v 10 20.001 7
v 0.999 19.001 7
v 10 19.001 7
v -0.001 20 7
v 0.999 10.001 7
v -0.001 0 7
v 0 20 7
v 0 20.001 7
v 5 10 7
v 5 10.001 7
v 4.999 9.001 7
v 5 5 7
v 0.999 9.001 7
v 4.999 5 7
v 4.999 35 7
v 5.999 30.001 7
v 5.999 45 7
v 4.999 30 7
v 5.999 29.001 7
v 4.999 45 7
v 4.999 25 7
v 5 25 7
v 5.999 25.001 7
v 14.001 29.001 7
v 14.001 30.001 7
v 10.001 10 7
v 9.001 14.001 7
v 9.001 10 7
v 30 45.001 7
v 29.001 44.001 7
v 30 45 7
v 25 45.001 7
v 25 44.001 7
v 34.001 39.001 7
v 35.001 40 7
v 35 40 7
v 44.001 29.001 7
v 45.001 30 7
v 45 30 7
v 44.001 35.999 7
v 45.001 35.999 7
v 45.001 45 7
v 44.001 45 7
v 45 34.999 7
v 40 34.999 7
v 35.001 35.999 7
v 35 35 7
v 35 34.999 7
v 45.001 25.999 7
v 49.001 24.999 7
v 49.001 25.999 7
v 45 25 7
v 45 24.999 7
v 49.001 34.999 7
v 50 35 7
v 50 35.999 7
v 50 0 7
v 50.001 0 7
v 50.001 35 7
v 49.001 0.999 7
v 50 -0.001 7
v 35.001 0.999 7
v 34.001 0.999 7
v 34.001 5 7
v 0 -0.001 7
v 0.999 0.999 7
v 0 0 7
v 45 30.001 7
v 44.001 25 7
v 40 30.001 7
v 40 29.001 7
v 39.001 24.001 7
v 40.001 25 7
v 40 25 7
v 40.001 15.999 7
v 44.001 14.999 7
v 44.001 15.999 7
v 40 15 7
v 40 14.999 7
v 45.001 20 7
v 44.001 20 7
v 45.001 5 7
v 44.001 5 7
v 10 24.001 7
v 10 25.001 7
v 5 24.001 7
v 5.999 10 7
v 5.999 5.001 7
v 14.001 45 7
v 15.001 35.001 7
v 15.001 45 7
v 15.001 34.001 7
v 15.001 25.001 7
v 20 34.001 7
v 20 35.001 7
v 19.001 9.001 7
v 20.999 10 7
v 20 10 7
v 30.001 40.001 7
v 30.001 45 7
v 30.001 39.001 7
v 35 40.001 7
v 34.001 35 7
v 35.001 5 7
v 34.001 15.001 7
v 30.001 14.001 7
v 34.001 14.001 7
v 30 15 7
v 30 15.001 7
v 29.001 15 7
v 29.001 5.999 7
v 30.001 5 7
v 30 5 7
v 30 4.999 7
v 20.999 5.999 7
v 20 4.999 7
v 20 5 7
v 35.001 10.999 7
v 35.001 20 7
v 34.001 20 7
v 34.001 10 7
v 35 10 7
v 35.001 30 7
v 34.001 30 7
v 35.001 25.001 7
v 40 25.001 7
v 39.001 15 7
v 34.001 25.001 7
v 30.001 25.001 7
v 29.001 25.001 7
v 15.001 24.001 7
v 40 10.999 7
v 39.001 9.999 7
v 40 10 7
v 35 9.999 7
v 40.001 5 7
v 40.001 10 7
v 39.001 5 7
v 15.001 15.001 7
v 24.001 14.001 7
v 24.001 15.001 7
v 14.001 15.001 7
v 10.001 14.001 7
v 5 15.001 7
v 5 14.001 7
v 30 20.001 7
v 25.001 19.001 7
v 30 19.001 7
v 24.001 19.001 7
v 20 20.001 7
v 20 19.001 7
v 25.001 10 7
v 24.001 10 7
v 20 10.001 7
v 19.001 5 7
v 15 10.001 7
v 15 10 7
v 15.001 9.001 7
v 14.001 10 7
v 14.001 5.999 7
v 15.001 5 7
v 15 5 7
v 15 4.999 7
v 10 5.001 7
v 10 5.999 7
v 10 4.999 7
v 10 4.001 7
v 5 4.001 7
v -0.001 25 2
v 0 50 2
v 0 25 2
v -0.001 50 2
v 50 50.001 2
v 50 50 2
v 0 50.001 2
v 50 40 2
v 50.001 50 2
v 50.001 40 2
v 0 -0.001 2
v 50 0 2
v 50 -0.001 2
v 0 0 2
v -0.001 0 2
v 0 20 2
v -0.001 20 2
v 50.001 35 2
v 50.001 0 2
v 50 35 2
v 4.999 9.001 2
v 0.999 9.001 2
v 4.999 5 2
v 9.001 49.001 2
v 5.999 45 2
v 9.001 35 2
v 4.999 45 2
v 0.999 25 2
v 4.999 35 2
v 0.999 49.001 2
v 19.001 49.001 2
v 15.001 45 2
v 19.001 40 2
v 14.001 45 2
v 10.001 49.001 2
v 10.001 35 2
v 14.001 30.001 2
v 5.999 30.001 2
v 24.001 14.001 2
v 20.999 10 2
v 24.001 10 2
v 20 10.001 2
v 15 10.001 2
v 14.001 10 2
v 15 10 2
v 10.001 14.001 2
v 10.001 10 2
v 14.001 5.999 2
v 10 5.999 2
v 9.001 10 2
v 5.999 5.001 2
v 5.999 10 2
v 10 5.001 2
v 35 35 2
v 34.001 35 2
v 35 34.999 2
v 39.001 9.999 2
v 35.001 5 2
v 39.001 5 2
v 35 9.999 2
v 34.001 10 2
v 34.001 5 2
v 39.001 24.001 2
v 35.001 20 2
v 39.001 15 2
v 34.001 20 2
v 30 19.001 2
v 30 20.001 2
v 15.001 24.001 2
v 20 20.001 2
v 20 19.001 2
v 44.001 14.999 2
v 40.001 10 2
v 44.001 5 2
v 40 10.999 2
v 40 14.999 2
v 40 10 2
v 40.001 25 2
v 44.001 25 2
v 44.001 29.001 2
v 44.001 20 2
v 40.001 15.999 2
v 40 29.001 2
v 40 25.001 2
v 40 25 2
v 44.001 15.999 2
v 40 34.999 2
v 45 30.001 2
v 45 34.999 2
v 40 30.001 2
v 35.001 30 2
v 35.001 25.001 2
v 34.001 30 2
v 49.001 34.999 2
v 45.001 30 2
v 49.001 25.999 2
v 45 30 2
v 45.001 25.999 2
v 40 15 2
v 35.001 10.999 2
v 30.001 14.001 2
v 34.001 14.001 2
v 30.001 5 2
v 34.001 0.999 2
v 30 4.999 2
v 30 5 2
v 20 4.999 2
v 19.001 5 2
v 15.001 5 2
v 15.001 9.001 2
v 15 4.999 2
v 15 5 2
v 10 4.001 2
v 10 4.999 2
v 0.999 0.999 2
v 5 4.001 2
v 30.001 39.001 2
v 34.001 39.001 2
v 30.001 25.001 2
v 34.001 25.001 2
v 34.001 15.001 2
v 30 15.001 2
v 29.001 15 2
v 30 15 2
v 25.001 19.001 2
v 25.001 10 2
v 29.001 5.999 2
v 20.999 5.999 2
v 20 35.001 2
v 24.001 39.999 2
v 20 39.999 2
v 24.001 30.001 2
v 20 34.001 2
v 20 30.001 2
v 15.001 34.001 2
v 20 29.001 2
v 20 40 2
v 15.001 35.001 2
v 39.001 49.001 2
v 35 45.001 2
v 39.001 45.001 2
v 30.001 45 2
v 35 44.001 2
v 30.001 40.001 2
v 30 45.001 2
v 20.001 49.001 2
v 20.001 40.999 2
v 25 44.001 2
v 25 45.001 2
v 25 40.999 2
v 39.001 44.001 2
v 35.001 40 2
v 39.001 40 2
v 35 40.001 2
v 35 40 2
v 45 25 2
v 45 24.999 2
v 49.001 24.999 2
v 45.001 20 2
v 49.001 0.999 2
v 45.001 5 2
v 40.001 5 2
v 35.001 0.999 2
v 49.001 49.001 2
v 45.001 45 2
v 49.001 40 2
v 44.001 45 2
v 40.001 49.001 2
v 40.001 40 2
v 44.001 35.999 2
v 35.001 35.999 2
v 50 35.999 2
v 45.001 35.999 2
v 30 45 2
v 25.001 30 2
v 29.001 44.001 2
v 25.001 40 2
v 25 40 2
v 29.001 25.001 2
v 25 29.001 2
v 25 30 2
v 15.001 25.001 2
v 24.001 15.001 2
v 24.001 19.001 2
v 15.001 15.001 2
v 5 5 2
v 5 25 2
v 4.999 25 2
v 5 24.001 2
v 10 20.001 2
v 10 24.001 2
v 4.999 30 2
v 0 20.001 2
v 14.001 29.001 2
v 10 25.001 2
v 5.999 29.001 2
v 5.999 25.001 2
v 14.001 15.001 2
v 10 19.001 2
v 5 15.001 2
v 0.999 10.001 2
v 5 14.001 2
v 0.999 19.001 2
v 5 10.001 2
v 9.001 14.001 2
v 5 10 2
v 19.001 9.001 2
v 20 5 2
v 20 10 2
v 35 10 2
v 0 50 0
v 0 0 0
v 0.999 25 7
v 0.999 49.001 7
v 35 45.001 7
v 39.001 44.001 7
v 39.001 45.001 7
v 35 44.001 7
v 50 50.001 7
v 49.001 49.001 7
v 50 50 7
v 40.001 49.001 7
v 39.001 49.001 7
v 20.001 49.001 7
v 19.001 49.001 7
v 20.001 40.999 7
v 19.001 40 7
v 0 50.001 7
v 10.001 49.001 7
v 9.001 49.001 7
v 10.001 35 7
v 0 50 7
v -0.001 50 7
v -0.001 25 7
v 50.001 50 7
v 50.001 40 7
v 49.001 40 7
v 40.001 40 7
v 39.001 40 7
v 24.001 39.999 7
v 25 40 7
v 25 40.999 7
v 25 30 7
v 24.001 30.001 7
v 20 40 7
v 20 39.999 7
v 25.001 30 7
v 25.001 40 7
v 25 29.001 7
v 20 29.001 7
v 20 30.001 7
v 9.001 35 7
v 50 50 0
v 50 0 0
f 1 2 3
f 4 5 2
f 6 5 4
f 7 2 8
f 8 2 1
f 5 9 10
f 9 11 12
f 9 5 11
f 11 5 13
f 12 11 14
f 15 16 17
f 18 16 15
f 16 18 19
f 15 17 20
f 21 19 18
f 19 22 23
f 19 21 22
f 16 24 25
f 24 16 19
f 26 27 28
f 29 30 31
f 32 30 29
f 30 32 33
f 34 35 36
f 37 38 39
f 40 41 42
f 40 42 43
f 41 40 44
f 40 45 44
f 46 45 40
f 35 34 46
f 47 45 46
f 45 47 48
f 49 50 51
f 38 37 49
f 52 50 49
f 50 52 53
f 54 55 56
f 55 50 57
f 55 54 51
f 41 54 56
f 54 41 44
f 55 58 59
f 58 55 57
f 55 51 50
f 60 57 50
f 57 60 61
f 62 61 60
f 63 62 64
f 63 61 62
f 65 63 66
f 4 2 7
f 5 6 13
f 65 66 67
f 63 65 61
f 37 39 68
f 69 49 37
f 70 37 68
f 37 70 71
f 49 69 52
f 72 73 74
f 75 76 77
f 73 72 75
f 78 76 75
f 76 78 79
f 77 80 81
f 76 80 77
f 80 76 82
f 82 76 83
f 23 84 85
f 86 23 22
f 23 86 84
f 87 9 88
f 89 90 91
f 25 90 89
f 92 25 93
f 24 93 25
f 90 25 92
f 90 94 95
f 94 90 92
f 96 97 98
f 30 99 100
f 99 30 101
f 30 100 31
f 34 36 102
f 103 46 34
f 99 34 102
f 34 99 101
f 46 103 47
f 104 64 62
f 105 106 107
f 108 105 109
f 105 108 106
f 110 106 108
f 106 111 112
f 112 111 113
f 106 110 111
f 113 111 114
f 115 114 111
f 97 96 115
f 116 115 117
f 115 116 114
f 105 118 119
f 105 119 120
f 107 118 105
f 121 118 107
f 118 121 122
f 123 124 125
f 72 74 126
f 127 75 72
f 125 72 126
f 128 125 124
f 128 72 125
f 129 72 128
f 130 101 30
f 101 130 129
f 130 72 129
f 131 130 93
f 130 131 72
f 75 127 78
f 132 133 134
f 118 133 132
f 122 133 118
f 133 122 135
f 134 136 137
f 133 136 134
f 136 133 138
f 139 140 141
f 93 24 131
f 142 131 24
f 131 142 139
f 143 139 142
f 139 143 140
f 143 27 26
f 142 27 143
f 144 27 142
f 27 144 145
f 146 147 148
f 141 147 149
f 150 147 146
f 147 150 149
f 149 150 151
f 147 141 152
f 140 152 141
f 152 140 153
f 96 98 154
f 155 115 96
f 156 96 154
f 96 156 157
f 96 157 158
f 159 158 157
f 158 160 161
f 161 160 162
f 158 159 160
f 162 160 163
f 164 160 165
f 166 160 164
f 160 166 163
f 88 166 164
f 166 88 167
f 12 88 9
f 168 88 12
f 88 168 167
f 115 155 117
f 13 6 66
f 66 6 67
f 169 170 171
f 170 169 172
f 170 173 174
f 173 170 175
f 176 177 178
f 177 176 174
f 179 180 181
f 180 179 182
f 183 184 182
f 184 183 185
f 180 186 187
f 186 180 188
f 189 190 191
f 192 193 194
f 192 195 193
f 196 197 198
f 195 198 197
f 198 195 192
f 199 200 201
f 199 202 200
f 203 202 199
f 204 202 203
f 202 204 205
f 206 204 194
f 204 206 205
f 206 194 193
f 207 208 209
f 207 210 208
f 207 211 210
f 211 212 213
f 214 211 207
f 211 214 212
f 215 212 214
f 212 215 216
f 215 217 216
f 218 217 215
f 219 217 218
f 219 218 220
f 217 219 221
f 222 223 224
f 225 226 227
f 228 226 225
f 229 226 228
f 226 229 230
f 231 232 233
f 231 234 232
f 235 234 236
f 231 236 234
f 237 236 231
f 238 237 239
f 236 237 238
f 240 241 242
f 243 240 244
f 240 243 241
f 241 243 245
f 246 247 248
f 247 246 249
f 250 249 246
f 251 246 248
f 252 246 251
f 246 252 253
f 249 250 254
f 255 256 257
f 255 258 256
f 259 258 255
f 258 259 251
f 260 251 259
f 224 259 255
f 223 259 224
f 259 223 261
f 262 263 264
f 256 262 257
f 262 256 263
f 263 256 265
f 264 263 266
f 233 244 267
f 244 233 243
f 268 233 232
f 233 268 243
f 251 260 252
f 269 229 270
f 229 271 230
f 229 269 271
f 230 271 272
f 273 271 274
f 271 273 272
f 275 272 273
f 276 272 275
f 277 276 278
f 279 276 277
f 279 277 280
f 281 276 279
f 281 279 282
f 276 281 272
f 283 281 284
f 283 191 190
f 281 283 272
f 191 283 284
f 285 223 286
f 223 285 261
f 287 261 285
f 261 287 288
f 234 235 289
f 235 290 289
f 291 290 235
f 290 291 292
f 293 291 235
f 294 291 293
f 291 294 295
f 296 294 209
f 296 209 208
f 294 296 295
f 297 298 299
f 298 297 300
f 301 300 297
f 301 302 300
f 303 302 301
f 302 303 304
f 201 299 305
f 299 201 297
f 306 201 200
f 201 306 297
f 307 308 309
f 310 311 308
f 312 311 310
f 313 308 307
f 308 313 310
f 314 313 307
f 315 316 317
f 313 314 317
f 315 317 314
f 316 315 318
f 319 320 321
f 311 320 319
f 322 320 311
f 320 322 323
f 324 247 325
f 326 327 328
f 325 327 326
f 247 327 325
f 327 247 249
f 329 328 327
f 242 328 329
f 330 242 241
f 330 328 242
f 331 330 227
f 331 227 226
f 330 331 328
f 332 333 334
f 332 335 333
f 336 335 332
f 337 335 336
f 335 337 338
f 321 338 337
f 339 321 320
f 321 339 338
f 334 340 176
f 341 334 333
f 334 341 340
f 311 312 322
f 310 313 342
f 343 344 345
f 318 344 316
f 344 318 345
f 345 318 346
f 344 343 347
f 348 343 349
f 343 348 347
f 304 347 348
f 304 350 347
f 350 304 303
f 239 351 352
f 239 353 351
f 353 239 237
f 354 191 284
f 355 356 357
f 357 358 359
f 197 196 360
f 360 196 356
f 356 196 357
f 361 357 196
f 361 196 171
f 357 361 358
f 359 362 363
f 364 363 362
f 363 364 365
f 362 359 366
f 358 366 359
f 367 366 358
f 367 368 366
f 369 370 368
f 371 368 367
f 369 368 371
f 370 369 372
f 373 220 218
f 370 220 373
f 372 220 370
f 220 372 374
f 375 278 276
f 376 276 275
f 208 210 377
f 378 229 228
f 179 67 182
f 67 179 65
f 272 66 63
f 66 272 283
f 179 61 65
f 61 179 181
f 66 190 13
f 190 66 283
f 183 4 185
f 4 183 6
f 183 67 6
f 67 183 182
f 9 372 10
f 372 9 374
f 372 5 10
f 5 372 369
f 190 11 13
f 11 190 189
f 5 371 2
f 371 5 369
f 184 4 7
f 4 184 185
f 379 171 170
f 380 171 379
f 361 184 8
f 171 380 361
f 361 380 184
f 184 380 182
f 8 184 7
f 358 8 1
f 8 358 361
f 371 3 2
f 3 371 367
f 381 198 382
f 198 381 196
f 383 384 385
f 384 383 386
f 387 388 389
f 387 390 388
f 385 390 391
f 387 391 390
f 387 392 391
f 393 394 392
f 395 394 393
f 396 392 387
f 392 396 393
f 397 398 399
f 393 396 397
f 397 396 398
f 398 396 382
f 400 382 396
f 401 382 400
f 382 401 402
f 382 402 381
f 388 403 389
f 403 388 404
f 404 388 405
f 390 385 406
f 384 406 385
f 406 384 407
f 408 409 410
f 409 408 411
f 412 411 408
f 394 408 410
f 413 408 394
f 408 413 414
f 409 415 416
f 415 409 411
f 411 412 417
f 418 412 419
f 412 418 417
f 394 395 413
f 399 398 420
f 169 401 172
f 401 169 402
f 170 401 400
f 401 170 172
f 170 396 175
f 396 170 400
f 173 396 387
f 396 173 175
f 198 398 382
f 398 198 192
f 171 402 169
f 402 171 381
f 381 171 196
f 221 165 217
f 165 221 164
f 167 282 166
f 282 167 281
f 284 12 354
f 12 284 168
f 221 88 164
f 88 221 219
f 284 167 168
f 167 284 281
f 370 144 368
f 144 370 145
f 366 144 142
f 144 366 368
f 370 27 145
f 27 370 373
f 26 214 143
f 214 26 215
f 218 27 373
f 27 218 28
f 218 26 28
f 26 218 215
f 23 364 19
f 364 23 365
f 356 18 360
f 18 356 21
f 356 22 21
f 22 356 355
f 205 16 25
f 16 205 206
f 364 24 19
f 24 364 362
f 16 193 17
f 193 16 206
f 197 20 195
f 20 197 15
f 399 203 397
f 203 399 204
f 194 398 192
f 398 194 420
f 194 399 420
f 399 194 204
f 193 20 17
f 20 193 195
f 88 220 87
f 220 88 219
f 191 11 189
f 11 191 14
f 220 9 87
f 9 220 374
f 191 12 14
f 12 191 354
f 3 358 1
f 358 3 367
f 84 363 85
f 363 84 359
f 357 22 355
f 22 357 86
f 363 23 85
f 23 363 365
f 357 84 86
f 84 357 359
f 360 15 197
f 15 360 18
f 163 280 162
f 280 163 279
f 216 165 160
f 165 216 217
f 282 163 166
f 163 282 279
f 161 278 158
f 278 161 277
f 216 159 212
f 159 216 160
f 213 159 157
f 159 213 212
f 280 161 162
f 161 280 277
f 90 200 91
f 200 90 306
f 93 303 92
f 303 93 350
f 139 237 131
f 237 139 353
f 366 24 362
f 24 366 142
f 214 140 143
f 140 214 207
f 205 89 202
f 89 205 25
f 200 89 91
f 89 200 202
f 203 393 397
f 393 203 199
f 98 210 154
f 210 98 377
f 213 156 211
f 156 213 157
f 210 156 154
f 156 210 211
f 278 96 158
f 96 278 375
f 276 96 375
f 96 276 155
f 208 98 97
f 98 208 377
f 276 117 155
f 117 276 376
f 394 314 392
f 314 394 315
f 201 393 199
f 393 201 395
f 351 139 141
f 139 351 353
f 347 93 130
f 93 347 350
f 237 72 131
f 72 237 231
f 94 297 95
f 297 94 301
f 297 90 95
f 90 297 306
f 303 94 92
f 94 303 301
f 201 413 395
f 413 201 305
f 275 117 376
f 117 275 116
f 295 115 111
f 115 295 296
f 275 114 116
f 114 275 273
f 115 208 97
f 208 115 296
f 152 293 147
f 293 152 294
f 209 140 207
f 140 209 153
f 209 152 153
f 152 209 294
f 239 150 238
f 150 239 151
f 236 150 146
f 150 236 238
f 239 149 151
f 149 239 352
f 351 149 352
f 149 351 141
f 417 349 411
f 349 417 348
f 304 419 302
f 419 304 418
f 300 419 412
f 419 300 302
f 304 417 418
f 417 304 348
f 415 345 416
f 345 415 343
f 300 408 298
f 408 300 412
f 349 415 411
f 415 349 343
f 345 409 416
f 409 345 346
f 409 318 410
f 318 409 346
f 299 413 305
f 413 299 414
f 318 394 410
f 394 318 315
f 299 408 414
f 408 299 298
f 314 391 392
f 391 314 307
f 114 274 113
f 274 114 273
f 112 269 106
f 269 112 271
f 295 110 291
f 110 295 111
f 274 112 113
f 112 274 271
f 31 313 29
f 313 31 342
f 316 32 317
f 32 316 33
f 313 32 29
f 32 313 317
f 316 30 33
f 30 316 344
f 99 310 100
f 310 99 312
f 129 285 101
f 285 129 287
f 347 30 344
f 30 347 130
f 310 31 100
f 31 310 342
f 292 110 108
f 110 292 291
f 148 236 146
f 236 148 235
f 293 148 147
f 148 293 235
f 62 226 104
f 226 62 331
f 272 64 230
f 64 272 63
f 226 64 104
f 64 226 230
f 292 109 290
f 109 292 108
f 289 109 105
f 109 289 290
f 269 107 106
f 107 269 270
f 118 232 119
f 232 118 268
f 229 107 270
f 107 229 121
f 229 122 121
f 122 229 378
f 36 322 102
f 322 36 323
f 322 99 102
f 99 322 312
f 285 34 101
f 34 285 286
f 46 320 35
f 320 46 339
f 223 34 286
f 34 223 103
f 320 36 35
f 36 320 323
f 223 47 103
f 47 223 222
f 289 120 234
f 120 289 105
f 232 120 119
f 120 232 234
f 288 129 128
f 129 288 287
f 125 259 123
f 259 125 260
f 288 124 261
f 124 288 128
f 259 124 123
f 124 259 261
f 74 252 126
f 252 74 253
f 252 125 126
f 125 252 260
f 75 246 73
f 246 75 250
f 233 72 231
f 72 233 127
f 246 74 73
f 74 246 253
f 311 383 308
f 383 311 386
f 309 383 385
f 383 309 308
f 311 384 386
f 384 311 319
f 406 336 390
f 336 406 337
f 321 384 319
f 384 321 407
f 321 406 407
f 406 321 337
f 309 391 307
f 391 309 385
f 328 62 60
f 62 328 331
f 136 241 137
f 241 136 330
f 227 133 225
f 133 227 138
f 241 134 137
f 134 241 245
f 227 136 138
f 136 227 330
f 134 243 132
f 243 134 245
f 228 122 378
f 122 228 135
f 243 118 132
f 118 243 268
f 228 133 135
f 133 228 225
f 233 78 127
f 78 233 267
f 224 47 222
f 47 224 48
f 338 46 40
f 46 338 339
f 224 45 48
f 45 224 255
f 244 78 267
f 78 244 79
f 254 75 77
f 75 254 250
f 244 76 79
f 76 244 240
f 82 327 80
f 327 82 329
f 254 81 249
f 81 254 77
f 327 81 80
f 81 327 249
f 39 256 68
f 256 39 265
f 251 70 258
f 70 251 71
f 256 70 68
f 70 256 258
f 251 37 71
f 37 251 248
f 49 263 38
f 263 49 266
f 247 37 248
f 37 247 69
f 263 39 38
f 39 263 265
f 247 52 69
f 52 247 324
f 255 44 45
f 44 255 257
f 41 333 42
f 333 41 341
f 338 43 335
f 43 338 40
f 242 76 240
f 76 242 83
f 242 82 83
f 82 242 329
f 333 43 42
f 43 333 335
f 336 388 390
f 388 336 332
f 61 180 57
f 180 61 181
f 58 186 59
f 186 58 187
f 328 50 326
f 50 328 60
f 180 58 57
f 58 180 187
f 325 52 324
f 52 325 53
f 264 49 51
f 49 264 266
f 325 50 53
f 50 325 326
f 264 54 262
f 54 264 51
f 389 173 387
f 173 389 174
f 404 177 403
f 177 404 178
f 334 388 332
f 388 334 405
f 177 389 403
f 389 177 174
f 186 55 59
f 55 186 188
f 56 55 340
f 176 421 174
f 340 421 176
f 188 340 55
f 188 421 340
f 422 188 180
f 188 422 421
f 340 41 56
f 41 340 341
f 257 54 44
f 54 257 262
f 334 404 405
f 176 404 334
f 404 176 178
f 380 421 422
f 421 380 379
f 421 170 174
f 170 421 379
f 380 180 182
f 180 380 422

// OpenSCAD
tile_width = 5;
wall = 1;
wall_height = 5;
plate_height = 2;

mazestring="03,06,02,06,00,02,02,02,02,06,br,05,02,12,04,04,06,02,10,10,12,br,01,09,04,08,08,12,08,08,08,04,br,01,12,04,00,04,00,04,00,08,12,br,01,03,12,12,04,04,08,08,01,04,br,01,09,08,04,04,08,08,08,12,04,br,09,00,12,08,04,08,00,12,00,04,br,01,08,01,08,12,00,00,01,12,12,br,01,08,08,09,00,12,00,09,08,04,br,09,08,08,08,08,09,08,01,08,12,br";


width=search("b",mazestring,1)[0]/3;
height=len(search("b",mazestring,99999)[0]);

maze(mazestring,width,height,tile_width,wall,wall_height,plate_height);



module maze(ms,w,h,t,wall,wallh,plateh){

	cube([h*t,w*t,plateh],false);
	union()
	for (j=[0:h-1]){
		for (i=[0:w-1]){
			translate([j*t,i*t,0]){
				translate([0,0,plateh]){
					wallcalc(str(ms[i*3+j*(w+1)*3], ms[i*3+j*(w+1)*3+1]), t, wall, wallh);
				}
			}
		}
	}
}


module wallcalc(i, t, wt,wh){
echo(i);
		if(i == "15"){
			wall(1,1,1,1, i, t, wt,wh);
		}else if(i == "14"){
			wall(0,1,1,1, i, t, wt,wh);
		}else if(i == "13"){
			wall(1,0,1,1, i, t, wt,wh);
		}else if(i == "12"){
			wall(0,0,1,1, i, t, wt,wh);
		}else if(i == "11"){
			wall(1,1,0,1, i, t, wt,wh);
		}else if(i == "10"){
			wall(0,1,0,1, i, t, wt,wh);
		}else if(i == "09"){
			wall(1,0,0,1, i, t, wt,wh);
		}else if(i == "08"){
			wall(0,0,0,1, i, t, wt,wh);
		}else if(i == "07"){
			wall(1,1,1,0, i, t, wt,wh);
		}else if(i == "06"){
			wall(0,1,1,0, i, t, wt,wh);
		}else if(i == "05"){
			wall(1,0,1,0, i, t, wt,wh);
		}else if(i == "04"){
			wall(0,0,1,0, i, t, wt,wh);
		}else if(i == "03"){
			wall(1,1,0,0, i, t, wt,wh);
		}else if(i == "02"){
			wall(0,1,0,0, i, t, wt,wh);
		}else if(i == "01"){
			wall(1,0,0,0, i, t, wt,wh);
		}else{
			//nothing
		}
}

module wall(a,b,c,d, i, t, wt,wh){
		if(a == 1)
			translate([0,-0.001,0])
				cube([t,wt,wh],false);
		if(b == 1)
			translate([-0.001,0,0])
				cube([wt,t,wh],false);
		if(c == 1)
			translate([0,(t-wt)+0.001,0])
				cube([t,wt,wh],false);
		if(d == 1)
			translate([(t-wt)+0.001,0,0])
				cube([wt,t,wh],false);
}
